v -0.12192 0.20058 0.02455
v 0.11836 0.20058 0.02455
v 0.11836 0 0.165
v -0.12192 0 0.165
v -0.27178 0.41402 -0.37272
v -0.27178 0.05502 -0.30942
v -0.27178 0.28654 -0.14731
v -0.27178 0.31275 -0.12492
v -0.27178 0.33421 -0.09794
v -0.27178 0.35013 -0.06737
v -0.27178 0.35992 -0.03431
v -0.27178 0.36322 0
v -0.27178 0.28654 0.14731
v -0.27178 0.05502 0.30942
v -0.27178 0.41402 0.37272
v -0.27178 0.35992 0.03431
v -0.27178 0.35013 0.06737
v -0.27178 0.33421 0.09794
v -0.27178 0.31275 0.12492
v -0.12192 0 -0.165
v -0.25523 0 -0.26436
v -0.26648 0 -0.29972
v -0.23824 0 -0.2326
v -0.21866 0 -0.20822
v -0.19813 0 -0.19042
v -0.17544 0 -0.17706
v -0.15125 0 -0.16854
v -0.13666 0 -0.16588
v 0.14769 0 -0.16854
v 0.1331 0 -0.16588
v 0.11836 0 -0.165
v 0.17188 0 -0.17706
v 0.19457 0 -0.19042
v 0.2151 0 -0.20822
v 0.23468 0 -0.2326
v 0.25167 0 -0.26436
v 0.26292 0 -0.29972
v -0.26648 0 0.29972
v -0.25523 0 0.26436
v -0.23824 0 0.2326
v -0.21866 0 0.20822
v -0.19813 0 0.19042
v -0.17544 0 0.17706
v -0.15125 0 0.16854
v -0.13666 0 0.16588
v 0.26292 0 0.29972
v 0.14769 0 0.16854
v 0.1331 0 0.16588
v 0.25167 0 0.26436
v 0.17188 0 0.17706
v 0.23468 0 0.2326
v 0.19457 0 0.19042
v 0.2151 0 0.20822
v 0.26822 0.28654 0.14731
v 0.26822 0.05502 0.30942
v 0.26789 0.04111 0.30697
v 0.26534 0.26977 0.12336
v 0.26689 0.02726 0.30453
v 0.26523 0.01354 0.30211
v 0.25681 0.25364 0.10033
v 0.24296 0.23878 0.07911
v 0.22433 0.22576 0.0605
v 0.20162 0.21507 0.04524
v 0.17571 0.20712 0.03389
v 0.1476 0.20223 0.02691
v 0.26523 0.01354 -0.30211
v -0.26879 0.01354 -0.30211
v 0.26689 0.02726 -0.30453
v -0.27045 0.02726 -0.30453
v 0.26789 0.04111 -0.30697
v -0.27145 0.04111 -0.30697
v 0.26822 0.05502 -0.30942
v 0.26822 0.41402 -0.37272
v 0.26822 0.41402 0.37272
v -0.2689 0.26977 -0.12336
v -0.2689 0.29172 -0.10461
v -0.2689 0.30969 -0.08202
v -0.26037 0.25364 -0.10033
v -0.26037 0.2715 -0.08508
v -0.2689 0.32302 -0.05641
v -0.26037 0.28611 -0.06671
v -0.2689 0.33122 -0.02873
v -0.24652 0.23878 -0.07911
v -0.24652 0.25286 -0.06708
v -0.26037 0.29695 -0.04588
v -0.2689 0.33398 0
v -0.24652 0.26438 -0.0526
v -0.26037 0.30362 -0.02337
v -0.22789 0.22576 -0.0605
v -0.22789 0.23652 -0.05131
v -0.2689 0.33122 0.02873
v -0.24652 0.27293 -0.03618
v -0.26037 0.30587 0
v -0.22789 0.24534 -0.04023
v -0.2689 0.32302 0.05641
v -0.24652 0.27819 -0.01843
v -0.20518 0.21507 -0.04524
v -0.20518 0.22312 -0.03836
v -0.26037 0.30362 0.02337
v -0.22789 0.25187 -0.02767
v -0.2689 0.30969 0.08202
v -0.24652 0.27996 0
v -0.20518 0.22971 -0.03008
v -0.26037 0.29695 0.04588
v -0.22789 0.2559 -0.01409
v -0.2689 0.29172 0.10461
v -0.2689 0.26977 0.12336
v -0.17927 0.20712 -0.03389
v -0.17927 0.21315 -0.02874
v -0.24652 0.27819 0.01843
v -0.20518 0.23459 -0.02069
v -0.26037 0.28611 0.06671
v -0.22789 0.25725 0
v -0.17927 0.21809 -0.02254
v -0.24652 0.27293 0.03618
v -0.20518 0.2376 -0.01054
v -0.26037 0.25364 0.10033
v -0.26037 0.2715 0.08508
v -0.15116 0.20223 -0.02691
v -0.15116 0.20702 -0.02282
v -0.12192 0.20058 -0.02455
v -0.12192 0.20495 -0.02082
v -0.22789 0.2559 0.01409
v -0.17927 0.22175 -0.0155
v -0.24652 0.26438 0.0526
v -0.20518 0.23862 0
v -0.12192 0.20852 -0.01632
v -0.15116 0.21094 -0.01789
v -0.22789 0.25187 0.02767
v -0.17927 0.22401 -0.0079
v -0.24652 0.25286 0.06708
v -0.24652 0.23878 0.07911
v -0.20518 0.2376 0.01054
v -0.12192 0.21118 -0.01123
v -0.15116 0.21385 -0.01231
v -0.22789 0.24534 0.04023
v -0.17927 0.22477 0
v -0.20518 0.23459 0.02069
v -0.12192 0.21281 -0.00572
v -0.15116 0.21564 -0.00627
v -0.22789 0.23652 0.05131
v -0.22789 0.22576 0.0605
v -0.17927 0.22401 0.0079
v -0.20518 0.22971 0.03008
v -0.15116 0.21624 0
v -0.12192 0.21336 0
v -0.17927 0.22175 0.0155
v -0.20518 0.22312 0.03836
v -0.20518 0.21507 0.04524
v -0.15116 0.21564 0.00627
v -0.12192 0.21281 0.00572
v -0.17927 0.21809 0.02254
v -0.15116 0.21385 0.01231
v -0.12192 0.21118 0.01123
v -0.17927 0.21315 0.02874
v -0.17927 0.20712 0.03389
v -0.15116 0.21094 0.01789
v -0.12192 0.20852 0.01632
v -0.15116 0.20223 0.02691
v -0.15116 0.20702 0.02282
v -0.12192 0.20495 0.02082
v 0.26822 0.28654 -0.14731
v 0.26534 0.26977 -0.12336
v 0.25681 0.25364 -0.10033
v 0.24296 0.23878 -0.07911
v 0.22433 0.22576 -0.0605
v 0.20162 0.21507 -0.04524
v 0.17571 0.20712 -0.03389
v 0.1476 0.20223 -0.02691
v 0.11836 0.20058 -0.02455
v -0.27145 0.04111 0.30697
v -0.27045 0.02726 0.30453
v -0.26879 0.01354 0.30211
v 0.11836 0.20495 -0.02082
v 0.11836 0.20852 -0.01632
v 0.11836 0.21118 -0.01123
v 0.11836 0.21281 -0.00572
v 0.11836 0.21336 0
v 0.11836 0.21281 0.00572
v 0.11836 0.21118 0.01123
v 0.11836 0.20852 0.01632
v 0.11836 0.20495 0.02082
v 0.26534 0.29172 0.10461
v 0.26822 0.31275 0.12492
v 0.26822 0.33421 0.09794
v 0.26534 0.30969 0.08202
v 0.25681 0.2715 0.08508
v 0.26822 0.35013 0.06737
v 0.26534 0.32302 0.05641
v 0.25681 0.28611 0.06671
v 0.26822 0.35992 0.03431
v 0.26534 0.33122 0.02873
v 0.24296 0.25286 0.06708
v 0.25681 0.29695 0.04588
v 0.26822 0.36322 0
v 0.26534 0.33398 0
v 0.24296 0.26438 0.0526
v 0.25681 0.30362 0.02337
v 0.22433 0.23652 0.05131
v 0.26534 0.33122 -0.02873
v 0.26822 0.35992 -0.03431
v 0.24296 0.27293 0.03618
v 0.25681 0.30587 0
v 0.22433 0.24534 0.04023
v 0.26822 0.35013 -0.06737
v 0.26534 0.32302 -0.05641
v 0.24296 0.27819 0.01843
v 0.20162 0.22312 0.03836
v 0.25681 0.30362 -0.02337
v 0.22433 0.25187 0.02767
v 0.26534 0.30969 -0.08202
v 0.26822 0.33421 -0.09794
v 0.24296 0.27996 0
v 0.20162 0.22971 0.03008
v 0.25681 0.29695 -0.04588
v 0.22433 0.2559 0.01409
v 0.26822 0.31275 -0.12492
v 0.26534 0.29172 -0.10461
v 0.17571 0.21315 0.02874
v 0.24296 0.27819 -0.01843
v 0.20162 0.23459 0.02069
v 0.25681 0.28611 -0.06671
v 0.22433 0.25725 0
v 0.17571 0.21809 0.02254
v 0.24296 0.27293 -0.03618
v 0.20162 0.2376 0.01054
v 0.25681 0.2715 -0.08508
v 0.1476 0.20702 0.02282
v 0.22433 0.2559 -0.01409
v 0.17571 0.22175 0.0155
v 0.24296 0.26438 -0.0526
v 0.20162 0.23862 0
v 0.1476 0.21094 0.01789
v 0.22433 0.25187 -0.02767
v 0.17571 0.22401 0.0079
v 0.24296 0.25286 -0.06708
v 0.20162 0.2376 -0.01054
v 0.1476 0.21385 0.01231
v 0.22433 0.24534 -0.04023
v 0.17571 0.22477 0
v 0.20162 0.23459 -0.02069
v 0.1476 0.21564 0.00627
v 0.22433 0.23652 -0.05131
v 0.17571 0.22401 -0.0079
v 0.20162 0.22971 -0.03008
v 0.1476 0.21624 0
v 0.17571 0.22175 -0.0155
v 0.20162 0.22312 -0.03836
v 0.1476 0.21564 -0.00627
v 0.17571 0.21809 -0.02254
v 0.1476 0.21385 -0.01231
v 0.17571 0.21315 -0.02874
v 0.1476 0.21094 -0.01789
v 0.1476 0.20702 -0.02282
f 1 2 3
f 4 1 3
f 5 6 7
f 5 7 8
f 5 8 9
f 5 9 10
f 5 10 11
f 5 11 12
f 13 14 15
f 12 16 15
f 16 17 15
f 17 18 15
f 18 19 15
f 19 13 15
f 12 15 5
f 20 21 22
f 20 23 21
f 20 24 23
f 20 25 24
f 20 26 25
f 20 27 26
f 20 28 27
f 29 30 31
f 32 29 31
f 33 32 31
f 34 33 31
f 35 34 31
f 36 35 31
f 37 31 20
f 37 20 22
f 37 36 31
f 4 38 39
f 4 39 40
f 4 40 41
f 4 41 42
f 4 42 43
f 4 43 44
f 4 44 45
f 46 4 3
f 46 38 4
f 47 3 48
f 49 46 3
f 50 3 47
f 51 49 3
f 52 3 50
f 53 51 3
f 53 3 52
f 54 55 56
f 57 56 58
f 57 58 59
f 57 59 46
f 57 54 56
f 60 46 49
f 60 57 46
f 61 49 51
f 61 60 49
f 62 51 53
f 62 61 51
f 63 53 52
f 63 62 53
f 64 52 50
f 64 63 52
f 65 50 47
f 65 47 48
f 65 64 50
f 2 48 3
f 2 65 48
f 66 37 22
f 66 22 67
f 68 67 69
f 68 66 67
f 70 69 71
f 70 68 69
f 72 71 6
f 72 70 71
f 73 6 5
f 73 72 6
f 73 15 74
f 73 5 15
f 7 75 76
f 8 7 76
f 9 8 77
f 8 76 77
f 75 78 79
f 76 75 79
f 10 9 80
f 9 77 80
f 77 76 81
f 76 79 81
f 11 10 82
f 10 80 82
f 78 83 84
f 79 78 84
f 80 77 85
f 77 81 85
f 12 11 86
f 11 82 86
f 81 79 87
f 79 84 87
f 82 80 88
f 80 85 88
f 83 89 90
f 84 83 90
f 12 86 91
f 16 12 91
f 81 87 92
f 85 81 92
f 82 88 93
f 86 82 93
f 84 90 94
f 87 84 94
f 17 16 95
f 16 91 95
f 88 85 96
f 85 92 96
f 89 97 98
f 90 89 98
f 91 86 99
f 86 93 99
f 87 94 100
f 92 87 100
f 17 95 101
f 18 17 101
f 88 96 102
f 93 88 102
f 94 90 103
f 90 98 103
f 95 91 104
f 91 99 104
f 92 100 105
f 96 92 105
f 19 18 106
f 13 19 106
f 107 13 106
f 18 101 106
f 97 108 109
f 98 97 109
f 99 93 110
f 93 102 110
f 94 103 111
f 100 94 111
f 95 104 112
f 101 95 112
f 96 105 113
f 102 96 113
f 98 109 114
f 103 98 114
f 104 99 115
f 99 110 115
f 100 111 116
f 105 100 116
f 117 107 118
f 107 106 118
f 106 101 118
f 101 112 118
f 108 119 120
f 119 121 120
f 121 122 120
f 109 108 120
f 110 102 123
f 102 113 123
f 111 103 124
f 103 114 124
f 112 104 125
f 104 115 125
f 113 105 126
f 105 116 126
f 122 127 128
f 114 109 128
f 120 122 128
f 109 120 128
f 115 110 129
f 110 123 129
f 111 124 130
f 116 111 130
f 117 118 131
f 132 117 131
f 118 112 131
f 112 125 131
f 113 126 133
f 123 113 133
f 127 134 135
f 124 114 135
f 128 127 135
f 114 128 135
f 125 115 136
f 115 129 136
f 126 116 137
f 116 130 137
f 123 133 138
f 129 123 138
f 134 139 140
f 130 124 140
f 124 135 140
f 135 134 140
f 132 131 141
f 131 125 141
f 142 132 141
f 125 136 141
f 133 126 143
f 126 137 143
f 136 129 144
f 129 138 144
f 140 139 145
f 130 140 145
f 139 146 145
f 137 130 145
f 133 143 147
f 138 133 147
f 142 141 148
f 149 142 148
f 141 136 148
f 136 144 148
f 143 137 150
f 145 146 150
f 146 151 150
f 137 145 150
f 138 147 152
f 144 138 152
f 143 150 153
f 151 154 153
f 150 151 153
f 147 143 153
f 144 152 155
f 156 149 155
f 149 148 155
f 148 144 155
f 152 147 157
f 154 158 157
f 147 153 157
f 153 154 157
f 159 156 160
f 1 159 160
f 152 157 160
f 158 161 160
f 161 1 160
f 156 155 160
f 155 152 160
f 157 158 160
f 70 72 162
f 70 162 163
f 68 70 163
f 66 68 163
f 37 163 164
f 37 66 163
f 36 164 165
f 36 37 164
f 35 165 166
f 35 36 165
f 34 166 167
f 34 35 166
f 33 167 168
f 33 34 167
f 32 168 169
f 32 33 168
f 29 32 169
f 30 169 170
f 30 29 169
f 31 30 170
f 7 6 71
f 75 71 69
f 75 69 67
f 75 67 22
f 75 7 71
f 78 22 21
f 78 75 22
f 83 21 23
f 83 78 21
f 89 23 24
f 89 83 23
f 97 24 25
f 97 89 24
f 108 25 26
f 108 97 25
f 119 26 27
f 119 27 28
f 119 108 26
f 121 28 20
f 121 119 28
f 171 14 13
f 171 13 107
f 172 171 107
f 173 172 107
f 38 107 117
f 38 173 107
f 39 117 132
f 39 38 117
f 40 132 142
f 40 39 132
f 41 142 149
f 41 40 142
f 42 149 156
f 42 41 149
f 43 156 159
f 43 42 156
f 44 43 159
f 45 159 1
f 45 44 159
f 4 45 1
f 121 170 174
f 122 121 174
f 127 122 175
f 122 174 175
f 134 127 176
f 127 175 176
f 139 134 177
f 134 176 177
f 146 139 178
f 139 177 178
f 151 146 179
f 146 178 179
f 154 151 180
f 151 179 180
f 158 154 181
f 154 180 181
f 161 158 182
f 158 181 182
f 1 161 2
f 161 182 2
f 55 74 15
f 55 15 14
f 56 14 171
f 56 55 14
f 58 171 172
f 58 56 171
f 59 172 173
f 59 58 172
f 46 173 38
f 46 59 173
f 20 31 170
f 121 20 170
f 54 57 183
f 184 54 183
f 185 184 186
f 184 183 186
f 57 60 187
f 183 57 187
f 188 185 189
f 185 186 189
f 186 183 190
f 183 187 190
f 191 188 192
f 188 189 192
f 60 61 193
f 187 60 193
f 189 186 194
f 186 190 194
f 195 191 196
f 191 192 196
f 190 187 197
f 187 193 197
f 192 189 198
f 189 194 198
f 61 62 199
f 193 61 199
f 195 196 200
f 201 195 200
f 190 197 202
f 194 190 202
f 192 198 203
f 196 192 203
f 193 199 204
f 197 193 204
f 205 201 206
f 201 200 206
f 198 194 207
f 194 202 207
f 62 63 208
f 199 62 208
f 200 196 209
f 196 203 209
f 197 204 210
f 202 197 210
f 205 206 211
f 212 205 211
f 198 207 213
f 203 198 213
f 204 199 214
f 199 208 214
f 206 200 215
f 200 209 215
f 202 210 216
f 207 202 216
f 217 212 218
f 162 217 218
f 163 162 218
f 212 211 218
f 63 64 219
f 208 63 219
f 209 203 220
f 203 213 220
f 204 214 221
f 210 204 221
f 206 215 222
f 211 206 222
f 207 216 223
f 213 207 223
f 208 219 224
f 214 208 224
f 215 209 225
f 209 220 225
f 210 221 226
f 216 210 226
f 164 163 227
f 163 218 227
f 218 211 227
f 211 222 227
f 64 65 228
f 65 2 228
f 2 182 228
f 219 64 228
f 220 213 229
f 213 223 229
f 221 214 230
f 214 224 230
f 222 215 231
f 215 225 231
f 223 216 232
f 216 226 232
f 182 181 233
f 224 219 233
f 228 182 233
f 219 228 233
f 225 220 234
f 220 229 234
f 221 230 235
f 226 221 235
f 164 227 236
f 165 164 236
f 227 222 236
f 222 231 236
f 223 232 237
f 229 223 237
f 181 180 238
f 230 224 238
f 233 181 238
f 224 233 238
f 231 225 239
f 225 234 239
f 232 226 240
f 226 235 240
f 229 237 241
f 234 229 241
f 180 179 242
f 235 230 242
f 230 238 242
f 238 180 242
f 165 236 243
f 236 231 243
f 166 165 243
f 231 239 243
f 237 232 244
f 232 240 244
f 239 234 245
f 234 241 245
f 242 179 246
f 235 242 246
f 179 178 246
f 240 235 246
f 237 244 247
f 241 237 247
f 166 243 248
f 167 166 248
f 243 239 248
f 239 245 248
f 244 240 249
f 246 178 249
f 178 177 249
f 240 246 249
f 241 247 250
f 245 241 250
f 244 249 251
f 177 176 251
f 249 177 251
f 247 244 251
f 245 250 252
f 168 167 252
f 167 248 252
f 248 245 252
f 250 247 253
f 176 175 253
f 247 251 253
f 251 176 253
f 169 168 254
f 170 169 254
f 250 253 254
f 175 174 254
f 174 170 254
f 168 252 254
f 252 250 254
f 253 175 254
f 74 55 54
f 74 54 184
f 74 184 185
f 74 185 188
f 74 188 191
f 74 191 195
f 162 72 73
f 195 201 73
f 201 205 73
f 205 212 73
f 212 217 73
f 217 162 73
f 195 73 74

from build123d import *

# Parameters (mm, degrees)
SKETCH_TL_CUTTING_R    = 1.4986
TL_CUTTING_DEPTH       = 29.999999944
SKETCH_TDF_CUTTING_W   = 3.01719996
SKETCH_TDF_CUTTING_H   = 3.01719996
TDF_CUTTING_DEPTH      = 31.074766841
VW_VR_GRINDING_DEPTH   = 1.50859998
VW_VR_GRINDING_2_DEPTH = 1.50859998
ISA_GRINDING_DEPTH     = 1.50859998
SKETCH_PRE_FRX_BRX_W   = 1.220380084
SKETCH_PRE_FRX_BRX_H   = 0.82042
SKETCH_PRE_FRX_BRX_W_2 = 1.24681996
PRE_FRX_BRX_DEPTH      = 1.50859998
FA_BA_GRINDING_DEPTH   = 1.50859998
BR_EDM_R               = 0.14986
FR_EDM_R               = 0.14986
ENGRAVING_DEPTH        = 0.005


with BuildPart() as part:
    # sketch_TL_cutting → TL_cutting (new body)
    with BuildSketch(Plane(origin=(0, 0, 0), x_dir=(1, 0, 0), z_dir=(0, 1, 0))):
        with Locations(Location((0, 0, 0), (0, 0, 270))):
            Circle(SKETCH_TL_CUTTING_R)
    extrude(amount=TL_CUTTING_DEPTH)

    # sketch_TDF_cutting → TDF_cutting (cut, through all)
    with BuildSketch(Plane(origin=(0, 0, 0), x_dir=(1, 0, 0), z_dir=(0, 1, 0))):
        with Locations((-2.71001998, 0)):
            Rectangle(SKETCH_TDF_CUTTING_W, SKETCH_TDF_CUTTING_H)
    extrude(amount=TDF_CUTTING_DEPTH, mode=Mode.SUBTRACT)


with BuildPart() as body_2:
    # sketch_VW_VR_grinding → VW_VR_grinding (new, symmetric)
    with BuildSketch(Plane(origin=(0, 0, 0), x_dir=(0, 0, -1), z_dir=(1, 0, 0))):
        with BuildLine():
            Line((-1.49360001, -0.00999998), (-1.49360001, 0.809308914))
            ThreePointArc((-1.49360001, 0.809308914), (-1.493648337, 0.810415792), (-1.493792952, 0.811514246))
            Line((-1.493792952, 0.811514246), (-1.51859996, 0.952201782))
            Line((-1.51859996, 0.952201782), (-1.50859998, -0.00999998))
            Line((-1.50859998, -0.00999998), (-1.49360001, -0.00999998))
        make_face()
    extrude(amount=VW_VR_GRINDING_DEPTH, both=True)


with BuildPart() as body_3:
    # sketch_VW_VR_grinding → VW_VR_grinding 2 (new, symmetric)
    with BuildSketch(Plane(origin=(0, 0, 0), x_dir=(0, 0, -1), z_dir=(1, 0, 0))):
        with BuildLine():
            Line((1.49360001, -0.00999998), (1.49360001, 0.809308914))
            ThreePointArc((1.49360001, 0.809308914), (1.493648337, 0.810415792), (1.493792952, 0.811514246))
            Line((1.493792952, 0.811514246), (1.51859996, 0.952201782))
            Line((1.51859996, 0.952201782), (1.50859998, -0.00999998))
            Line((1.50859998, -0.00999998), (1.49360001, -0.00999998))
        make_face()
    extrude(amount=VW_VR_GRINDING_2_DEPTH, both=True)


    add(body_2.part)  # ISA_grinding merges body 2
    # sketch_ISA_grinding → ISA_grinding (add, symmetric)
    with BuildSketch(Plane(origin=(0, 0, 0), x_dir=(0, 0, -1), z_dir=(1, 0, 0))):
        Polygon((-0.29972, 0), (0.29972, 0), (1.50859998, 6.855899053), (1.50859998, -0.02999994), (-1.50859998, -0.02999994), (-1.50859998, 6.855899053), align=None)
    extrude(amount=ISA_GRINDING_DEPTH, both=True)

    # sketch_pre_FRX_BRX → pre_FRX_BRX (add, symmetric)
    with BuildSketch(Plane.XY):
        with Locations((0.888409958, 0.40021002)):
            Rectangle(SKETCH_PRE_FRX_BRX_W, SKETCH_PRE_FRX_BRX_H)
        with Locations((-0.89518998, 0.40021002)):
            Rectangle(SKETCH_PRE_FRX_BRX_W_2, SKETCH_PRE_FRX_BRX_H)
    extrude(amount=PRE_FRX_BRX_DEPTH, both=True)

    # sketch_FA_BA_grinding → FA_BA_grinding (add, symmetric)
    with BuildSketch(Plane.XY):
        Polygon((0.268219936, -0.00999998), (0.268219936, 0.82042), (1.6256, 10.478681009), (1.6256, -0.00999998), align=None)
        Polygon((-0.27178, -0.00999998), (-0.27178, 0.82042), (-1.32842, 8.338804263), (-1.32842, -0.00999998), align=None)
    extrude(amount=FA_BA_GRINDING_DEPTH, both=True)


with BuildPart() as part_1:
    add(part.part)

    # B1_fix: cut body 3
    add(body_3.part, mode=Mode.SUBTRACT)

    # V-Groove_EDM: sweep along a path in sketch_contour_V-Groove
    with BuildLine(Plane.XY) as v_groove_edm_path:
        Line((-1.20142, 0.21336), (1.4986, 0.21336))
    # sketch_section_V-Groove → V-Groove_EDM (sweep, cut)
    with BuildSketch(Plane(origin=(-1.20142, 0, -1.2954), x_dir=(0, 0, -1), z_dir=(1, 0, 0))):
        with BuildLine():
            Line((-1.270850039, 0.200580099), (-1.12340028, -0.00999998))
            Line((-1.12340028, -0.00999998), (-1.46739972, -0.00999998))
            Line((-1.46739972, -0.00999998), (-1.319949961, 0.200580099))
            ThreePointArc((-1.319949961, 0.200580099), (-1.2954, 0.21336), (-1.270850039, 0.200580099))
        make_face()
    sweep(path=v_groove_edm_path.line, mode=Mode.SUBTRACT)

    # BR_EDM
    br_edm_edges = [part_1.edges().sort_by_distance(p)[0] for p in [
        (-0.27178, 0.21336, 0),
        (-0.27178, 0.10029005, -0.094773809),
        (-0.27178, 0.10029005, 0.094773809),
    ]]
    fillet(br_edm_edges, radius=BR_EDM_R)

    # FR_EDM
    fr_edm_edges = [part_1.edges().sort_by_distance(p)[0] for p in [
        (0.268219936, 0.10029005, -0.094773809),
        (0.268219936, 0.10029005, 0.094773809),
        (0.268219936, 0.21336, 0),
    ]]
    fillet(fr_edm_edges, radius=FR_EDM_R)

    # sketch_Engraving → Engraving (cut)
    with BuildSketch(Plane.ZY.offset(1.20142)):
        Polygon((-0.347748486, 0.295081019), (-0.475308325, 0.169076788), (-0.664833208, 0.042294753), (-0.91554533, -0.085524354), (-1.231852248, -0.147489398), (-1.486194122, -0.147489398), (-1.802501039, -0.085524354), (-2.055028038, 0.042294753), (-2.24455292, 0.169076788), (-2.372112759, 0.295081019), (-2.35033425, 0.316081724), (-2.227181966, 0.191114565), (-2.041027567, 0.06692521), (-1.791871053, -0.056486342), (-1.48256437, -0.119488457), (-1.235481999, -0.119488457), (-0.926175317, -0.056486342), (-0.678833678, 0.06692521), (-0.492679279, 0.191114565), (-0.369526995, 0.316081724), align=None)
    extrude(amount=-ENGRAVING_DEPTH, mode=Mode.SUBTRACT)

    # SurfaceCut1
    split(bisect_by=Plane(origin=(0, 0.41401793, 0), x_dir=(1, 0, 0), z_dir=(0, 1, 0)), keep=Keep.BOTTOM)


solid = part_1.part
